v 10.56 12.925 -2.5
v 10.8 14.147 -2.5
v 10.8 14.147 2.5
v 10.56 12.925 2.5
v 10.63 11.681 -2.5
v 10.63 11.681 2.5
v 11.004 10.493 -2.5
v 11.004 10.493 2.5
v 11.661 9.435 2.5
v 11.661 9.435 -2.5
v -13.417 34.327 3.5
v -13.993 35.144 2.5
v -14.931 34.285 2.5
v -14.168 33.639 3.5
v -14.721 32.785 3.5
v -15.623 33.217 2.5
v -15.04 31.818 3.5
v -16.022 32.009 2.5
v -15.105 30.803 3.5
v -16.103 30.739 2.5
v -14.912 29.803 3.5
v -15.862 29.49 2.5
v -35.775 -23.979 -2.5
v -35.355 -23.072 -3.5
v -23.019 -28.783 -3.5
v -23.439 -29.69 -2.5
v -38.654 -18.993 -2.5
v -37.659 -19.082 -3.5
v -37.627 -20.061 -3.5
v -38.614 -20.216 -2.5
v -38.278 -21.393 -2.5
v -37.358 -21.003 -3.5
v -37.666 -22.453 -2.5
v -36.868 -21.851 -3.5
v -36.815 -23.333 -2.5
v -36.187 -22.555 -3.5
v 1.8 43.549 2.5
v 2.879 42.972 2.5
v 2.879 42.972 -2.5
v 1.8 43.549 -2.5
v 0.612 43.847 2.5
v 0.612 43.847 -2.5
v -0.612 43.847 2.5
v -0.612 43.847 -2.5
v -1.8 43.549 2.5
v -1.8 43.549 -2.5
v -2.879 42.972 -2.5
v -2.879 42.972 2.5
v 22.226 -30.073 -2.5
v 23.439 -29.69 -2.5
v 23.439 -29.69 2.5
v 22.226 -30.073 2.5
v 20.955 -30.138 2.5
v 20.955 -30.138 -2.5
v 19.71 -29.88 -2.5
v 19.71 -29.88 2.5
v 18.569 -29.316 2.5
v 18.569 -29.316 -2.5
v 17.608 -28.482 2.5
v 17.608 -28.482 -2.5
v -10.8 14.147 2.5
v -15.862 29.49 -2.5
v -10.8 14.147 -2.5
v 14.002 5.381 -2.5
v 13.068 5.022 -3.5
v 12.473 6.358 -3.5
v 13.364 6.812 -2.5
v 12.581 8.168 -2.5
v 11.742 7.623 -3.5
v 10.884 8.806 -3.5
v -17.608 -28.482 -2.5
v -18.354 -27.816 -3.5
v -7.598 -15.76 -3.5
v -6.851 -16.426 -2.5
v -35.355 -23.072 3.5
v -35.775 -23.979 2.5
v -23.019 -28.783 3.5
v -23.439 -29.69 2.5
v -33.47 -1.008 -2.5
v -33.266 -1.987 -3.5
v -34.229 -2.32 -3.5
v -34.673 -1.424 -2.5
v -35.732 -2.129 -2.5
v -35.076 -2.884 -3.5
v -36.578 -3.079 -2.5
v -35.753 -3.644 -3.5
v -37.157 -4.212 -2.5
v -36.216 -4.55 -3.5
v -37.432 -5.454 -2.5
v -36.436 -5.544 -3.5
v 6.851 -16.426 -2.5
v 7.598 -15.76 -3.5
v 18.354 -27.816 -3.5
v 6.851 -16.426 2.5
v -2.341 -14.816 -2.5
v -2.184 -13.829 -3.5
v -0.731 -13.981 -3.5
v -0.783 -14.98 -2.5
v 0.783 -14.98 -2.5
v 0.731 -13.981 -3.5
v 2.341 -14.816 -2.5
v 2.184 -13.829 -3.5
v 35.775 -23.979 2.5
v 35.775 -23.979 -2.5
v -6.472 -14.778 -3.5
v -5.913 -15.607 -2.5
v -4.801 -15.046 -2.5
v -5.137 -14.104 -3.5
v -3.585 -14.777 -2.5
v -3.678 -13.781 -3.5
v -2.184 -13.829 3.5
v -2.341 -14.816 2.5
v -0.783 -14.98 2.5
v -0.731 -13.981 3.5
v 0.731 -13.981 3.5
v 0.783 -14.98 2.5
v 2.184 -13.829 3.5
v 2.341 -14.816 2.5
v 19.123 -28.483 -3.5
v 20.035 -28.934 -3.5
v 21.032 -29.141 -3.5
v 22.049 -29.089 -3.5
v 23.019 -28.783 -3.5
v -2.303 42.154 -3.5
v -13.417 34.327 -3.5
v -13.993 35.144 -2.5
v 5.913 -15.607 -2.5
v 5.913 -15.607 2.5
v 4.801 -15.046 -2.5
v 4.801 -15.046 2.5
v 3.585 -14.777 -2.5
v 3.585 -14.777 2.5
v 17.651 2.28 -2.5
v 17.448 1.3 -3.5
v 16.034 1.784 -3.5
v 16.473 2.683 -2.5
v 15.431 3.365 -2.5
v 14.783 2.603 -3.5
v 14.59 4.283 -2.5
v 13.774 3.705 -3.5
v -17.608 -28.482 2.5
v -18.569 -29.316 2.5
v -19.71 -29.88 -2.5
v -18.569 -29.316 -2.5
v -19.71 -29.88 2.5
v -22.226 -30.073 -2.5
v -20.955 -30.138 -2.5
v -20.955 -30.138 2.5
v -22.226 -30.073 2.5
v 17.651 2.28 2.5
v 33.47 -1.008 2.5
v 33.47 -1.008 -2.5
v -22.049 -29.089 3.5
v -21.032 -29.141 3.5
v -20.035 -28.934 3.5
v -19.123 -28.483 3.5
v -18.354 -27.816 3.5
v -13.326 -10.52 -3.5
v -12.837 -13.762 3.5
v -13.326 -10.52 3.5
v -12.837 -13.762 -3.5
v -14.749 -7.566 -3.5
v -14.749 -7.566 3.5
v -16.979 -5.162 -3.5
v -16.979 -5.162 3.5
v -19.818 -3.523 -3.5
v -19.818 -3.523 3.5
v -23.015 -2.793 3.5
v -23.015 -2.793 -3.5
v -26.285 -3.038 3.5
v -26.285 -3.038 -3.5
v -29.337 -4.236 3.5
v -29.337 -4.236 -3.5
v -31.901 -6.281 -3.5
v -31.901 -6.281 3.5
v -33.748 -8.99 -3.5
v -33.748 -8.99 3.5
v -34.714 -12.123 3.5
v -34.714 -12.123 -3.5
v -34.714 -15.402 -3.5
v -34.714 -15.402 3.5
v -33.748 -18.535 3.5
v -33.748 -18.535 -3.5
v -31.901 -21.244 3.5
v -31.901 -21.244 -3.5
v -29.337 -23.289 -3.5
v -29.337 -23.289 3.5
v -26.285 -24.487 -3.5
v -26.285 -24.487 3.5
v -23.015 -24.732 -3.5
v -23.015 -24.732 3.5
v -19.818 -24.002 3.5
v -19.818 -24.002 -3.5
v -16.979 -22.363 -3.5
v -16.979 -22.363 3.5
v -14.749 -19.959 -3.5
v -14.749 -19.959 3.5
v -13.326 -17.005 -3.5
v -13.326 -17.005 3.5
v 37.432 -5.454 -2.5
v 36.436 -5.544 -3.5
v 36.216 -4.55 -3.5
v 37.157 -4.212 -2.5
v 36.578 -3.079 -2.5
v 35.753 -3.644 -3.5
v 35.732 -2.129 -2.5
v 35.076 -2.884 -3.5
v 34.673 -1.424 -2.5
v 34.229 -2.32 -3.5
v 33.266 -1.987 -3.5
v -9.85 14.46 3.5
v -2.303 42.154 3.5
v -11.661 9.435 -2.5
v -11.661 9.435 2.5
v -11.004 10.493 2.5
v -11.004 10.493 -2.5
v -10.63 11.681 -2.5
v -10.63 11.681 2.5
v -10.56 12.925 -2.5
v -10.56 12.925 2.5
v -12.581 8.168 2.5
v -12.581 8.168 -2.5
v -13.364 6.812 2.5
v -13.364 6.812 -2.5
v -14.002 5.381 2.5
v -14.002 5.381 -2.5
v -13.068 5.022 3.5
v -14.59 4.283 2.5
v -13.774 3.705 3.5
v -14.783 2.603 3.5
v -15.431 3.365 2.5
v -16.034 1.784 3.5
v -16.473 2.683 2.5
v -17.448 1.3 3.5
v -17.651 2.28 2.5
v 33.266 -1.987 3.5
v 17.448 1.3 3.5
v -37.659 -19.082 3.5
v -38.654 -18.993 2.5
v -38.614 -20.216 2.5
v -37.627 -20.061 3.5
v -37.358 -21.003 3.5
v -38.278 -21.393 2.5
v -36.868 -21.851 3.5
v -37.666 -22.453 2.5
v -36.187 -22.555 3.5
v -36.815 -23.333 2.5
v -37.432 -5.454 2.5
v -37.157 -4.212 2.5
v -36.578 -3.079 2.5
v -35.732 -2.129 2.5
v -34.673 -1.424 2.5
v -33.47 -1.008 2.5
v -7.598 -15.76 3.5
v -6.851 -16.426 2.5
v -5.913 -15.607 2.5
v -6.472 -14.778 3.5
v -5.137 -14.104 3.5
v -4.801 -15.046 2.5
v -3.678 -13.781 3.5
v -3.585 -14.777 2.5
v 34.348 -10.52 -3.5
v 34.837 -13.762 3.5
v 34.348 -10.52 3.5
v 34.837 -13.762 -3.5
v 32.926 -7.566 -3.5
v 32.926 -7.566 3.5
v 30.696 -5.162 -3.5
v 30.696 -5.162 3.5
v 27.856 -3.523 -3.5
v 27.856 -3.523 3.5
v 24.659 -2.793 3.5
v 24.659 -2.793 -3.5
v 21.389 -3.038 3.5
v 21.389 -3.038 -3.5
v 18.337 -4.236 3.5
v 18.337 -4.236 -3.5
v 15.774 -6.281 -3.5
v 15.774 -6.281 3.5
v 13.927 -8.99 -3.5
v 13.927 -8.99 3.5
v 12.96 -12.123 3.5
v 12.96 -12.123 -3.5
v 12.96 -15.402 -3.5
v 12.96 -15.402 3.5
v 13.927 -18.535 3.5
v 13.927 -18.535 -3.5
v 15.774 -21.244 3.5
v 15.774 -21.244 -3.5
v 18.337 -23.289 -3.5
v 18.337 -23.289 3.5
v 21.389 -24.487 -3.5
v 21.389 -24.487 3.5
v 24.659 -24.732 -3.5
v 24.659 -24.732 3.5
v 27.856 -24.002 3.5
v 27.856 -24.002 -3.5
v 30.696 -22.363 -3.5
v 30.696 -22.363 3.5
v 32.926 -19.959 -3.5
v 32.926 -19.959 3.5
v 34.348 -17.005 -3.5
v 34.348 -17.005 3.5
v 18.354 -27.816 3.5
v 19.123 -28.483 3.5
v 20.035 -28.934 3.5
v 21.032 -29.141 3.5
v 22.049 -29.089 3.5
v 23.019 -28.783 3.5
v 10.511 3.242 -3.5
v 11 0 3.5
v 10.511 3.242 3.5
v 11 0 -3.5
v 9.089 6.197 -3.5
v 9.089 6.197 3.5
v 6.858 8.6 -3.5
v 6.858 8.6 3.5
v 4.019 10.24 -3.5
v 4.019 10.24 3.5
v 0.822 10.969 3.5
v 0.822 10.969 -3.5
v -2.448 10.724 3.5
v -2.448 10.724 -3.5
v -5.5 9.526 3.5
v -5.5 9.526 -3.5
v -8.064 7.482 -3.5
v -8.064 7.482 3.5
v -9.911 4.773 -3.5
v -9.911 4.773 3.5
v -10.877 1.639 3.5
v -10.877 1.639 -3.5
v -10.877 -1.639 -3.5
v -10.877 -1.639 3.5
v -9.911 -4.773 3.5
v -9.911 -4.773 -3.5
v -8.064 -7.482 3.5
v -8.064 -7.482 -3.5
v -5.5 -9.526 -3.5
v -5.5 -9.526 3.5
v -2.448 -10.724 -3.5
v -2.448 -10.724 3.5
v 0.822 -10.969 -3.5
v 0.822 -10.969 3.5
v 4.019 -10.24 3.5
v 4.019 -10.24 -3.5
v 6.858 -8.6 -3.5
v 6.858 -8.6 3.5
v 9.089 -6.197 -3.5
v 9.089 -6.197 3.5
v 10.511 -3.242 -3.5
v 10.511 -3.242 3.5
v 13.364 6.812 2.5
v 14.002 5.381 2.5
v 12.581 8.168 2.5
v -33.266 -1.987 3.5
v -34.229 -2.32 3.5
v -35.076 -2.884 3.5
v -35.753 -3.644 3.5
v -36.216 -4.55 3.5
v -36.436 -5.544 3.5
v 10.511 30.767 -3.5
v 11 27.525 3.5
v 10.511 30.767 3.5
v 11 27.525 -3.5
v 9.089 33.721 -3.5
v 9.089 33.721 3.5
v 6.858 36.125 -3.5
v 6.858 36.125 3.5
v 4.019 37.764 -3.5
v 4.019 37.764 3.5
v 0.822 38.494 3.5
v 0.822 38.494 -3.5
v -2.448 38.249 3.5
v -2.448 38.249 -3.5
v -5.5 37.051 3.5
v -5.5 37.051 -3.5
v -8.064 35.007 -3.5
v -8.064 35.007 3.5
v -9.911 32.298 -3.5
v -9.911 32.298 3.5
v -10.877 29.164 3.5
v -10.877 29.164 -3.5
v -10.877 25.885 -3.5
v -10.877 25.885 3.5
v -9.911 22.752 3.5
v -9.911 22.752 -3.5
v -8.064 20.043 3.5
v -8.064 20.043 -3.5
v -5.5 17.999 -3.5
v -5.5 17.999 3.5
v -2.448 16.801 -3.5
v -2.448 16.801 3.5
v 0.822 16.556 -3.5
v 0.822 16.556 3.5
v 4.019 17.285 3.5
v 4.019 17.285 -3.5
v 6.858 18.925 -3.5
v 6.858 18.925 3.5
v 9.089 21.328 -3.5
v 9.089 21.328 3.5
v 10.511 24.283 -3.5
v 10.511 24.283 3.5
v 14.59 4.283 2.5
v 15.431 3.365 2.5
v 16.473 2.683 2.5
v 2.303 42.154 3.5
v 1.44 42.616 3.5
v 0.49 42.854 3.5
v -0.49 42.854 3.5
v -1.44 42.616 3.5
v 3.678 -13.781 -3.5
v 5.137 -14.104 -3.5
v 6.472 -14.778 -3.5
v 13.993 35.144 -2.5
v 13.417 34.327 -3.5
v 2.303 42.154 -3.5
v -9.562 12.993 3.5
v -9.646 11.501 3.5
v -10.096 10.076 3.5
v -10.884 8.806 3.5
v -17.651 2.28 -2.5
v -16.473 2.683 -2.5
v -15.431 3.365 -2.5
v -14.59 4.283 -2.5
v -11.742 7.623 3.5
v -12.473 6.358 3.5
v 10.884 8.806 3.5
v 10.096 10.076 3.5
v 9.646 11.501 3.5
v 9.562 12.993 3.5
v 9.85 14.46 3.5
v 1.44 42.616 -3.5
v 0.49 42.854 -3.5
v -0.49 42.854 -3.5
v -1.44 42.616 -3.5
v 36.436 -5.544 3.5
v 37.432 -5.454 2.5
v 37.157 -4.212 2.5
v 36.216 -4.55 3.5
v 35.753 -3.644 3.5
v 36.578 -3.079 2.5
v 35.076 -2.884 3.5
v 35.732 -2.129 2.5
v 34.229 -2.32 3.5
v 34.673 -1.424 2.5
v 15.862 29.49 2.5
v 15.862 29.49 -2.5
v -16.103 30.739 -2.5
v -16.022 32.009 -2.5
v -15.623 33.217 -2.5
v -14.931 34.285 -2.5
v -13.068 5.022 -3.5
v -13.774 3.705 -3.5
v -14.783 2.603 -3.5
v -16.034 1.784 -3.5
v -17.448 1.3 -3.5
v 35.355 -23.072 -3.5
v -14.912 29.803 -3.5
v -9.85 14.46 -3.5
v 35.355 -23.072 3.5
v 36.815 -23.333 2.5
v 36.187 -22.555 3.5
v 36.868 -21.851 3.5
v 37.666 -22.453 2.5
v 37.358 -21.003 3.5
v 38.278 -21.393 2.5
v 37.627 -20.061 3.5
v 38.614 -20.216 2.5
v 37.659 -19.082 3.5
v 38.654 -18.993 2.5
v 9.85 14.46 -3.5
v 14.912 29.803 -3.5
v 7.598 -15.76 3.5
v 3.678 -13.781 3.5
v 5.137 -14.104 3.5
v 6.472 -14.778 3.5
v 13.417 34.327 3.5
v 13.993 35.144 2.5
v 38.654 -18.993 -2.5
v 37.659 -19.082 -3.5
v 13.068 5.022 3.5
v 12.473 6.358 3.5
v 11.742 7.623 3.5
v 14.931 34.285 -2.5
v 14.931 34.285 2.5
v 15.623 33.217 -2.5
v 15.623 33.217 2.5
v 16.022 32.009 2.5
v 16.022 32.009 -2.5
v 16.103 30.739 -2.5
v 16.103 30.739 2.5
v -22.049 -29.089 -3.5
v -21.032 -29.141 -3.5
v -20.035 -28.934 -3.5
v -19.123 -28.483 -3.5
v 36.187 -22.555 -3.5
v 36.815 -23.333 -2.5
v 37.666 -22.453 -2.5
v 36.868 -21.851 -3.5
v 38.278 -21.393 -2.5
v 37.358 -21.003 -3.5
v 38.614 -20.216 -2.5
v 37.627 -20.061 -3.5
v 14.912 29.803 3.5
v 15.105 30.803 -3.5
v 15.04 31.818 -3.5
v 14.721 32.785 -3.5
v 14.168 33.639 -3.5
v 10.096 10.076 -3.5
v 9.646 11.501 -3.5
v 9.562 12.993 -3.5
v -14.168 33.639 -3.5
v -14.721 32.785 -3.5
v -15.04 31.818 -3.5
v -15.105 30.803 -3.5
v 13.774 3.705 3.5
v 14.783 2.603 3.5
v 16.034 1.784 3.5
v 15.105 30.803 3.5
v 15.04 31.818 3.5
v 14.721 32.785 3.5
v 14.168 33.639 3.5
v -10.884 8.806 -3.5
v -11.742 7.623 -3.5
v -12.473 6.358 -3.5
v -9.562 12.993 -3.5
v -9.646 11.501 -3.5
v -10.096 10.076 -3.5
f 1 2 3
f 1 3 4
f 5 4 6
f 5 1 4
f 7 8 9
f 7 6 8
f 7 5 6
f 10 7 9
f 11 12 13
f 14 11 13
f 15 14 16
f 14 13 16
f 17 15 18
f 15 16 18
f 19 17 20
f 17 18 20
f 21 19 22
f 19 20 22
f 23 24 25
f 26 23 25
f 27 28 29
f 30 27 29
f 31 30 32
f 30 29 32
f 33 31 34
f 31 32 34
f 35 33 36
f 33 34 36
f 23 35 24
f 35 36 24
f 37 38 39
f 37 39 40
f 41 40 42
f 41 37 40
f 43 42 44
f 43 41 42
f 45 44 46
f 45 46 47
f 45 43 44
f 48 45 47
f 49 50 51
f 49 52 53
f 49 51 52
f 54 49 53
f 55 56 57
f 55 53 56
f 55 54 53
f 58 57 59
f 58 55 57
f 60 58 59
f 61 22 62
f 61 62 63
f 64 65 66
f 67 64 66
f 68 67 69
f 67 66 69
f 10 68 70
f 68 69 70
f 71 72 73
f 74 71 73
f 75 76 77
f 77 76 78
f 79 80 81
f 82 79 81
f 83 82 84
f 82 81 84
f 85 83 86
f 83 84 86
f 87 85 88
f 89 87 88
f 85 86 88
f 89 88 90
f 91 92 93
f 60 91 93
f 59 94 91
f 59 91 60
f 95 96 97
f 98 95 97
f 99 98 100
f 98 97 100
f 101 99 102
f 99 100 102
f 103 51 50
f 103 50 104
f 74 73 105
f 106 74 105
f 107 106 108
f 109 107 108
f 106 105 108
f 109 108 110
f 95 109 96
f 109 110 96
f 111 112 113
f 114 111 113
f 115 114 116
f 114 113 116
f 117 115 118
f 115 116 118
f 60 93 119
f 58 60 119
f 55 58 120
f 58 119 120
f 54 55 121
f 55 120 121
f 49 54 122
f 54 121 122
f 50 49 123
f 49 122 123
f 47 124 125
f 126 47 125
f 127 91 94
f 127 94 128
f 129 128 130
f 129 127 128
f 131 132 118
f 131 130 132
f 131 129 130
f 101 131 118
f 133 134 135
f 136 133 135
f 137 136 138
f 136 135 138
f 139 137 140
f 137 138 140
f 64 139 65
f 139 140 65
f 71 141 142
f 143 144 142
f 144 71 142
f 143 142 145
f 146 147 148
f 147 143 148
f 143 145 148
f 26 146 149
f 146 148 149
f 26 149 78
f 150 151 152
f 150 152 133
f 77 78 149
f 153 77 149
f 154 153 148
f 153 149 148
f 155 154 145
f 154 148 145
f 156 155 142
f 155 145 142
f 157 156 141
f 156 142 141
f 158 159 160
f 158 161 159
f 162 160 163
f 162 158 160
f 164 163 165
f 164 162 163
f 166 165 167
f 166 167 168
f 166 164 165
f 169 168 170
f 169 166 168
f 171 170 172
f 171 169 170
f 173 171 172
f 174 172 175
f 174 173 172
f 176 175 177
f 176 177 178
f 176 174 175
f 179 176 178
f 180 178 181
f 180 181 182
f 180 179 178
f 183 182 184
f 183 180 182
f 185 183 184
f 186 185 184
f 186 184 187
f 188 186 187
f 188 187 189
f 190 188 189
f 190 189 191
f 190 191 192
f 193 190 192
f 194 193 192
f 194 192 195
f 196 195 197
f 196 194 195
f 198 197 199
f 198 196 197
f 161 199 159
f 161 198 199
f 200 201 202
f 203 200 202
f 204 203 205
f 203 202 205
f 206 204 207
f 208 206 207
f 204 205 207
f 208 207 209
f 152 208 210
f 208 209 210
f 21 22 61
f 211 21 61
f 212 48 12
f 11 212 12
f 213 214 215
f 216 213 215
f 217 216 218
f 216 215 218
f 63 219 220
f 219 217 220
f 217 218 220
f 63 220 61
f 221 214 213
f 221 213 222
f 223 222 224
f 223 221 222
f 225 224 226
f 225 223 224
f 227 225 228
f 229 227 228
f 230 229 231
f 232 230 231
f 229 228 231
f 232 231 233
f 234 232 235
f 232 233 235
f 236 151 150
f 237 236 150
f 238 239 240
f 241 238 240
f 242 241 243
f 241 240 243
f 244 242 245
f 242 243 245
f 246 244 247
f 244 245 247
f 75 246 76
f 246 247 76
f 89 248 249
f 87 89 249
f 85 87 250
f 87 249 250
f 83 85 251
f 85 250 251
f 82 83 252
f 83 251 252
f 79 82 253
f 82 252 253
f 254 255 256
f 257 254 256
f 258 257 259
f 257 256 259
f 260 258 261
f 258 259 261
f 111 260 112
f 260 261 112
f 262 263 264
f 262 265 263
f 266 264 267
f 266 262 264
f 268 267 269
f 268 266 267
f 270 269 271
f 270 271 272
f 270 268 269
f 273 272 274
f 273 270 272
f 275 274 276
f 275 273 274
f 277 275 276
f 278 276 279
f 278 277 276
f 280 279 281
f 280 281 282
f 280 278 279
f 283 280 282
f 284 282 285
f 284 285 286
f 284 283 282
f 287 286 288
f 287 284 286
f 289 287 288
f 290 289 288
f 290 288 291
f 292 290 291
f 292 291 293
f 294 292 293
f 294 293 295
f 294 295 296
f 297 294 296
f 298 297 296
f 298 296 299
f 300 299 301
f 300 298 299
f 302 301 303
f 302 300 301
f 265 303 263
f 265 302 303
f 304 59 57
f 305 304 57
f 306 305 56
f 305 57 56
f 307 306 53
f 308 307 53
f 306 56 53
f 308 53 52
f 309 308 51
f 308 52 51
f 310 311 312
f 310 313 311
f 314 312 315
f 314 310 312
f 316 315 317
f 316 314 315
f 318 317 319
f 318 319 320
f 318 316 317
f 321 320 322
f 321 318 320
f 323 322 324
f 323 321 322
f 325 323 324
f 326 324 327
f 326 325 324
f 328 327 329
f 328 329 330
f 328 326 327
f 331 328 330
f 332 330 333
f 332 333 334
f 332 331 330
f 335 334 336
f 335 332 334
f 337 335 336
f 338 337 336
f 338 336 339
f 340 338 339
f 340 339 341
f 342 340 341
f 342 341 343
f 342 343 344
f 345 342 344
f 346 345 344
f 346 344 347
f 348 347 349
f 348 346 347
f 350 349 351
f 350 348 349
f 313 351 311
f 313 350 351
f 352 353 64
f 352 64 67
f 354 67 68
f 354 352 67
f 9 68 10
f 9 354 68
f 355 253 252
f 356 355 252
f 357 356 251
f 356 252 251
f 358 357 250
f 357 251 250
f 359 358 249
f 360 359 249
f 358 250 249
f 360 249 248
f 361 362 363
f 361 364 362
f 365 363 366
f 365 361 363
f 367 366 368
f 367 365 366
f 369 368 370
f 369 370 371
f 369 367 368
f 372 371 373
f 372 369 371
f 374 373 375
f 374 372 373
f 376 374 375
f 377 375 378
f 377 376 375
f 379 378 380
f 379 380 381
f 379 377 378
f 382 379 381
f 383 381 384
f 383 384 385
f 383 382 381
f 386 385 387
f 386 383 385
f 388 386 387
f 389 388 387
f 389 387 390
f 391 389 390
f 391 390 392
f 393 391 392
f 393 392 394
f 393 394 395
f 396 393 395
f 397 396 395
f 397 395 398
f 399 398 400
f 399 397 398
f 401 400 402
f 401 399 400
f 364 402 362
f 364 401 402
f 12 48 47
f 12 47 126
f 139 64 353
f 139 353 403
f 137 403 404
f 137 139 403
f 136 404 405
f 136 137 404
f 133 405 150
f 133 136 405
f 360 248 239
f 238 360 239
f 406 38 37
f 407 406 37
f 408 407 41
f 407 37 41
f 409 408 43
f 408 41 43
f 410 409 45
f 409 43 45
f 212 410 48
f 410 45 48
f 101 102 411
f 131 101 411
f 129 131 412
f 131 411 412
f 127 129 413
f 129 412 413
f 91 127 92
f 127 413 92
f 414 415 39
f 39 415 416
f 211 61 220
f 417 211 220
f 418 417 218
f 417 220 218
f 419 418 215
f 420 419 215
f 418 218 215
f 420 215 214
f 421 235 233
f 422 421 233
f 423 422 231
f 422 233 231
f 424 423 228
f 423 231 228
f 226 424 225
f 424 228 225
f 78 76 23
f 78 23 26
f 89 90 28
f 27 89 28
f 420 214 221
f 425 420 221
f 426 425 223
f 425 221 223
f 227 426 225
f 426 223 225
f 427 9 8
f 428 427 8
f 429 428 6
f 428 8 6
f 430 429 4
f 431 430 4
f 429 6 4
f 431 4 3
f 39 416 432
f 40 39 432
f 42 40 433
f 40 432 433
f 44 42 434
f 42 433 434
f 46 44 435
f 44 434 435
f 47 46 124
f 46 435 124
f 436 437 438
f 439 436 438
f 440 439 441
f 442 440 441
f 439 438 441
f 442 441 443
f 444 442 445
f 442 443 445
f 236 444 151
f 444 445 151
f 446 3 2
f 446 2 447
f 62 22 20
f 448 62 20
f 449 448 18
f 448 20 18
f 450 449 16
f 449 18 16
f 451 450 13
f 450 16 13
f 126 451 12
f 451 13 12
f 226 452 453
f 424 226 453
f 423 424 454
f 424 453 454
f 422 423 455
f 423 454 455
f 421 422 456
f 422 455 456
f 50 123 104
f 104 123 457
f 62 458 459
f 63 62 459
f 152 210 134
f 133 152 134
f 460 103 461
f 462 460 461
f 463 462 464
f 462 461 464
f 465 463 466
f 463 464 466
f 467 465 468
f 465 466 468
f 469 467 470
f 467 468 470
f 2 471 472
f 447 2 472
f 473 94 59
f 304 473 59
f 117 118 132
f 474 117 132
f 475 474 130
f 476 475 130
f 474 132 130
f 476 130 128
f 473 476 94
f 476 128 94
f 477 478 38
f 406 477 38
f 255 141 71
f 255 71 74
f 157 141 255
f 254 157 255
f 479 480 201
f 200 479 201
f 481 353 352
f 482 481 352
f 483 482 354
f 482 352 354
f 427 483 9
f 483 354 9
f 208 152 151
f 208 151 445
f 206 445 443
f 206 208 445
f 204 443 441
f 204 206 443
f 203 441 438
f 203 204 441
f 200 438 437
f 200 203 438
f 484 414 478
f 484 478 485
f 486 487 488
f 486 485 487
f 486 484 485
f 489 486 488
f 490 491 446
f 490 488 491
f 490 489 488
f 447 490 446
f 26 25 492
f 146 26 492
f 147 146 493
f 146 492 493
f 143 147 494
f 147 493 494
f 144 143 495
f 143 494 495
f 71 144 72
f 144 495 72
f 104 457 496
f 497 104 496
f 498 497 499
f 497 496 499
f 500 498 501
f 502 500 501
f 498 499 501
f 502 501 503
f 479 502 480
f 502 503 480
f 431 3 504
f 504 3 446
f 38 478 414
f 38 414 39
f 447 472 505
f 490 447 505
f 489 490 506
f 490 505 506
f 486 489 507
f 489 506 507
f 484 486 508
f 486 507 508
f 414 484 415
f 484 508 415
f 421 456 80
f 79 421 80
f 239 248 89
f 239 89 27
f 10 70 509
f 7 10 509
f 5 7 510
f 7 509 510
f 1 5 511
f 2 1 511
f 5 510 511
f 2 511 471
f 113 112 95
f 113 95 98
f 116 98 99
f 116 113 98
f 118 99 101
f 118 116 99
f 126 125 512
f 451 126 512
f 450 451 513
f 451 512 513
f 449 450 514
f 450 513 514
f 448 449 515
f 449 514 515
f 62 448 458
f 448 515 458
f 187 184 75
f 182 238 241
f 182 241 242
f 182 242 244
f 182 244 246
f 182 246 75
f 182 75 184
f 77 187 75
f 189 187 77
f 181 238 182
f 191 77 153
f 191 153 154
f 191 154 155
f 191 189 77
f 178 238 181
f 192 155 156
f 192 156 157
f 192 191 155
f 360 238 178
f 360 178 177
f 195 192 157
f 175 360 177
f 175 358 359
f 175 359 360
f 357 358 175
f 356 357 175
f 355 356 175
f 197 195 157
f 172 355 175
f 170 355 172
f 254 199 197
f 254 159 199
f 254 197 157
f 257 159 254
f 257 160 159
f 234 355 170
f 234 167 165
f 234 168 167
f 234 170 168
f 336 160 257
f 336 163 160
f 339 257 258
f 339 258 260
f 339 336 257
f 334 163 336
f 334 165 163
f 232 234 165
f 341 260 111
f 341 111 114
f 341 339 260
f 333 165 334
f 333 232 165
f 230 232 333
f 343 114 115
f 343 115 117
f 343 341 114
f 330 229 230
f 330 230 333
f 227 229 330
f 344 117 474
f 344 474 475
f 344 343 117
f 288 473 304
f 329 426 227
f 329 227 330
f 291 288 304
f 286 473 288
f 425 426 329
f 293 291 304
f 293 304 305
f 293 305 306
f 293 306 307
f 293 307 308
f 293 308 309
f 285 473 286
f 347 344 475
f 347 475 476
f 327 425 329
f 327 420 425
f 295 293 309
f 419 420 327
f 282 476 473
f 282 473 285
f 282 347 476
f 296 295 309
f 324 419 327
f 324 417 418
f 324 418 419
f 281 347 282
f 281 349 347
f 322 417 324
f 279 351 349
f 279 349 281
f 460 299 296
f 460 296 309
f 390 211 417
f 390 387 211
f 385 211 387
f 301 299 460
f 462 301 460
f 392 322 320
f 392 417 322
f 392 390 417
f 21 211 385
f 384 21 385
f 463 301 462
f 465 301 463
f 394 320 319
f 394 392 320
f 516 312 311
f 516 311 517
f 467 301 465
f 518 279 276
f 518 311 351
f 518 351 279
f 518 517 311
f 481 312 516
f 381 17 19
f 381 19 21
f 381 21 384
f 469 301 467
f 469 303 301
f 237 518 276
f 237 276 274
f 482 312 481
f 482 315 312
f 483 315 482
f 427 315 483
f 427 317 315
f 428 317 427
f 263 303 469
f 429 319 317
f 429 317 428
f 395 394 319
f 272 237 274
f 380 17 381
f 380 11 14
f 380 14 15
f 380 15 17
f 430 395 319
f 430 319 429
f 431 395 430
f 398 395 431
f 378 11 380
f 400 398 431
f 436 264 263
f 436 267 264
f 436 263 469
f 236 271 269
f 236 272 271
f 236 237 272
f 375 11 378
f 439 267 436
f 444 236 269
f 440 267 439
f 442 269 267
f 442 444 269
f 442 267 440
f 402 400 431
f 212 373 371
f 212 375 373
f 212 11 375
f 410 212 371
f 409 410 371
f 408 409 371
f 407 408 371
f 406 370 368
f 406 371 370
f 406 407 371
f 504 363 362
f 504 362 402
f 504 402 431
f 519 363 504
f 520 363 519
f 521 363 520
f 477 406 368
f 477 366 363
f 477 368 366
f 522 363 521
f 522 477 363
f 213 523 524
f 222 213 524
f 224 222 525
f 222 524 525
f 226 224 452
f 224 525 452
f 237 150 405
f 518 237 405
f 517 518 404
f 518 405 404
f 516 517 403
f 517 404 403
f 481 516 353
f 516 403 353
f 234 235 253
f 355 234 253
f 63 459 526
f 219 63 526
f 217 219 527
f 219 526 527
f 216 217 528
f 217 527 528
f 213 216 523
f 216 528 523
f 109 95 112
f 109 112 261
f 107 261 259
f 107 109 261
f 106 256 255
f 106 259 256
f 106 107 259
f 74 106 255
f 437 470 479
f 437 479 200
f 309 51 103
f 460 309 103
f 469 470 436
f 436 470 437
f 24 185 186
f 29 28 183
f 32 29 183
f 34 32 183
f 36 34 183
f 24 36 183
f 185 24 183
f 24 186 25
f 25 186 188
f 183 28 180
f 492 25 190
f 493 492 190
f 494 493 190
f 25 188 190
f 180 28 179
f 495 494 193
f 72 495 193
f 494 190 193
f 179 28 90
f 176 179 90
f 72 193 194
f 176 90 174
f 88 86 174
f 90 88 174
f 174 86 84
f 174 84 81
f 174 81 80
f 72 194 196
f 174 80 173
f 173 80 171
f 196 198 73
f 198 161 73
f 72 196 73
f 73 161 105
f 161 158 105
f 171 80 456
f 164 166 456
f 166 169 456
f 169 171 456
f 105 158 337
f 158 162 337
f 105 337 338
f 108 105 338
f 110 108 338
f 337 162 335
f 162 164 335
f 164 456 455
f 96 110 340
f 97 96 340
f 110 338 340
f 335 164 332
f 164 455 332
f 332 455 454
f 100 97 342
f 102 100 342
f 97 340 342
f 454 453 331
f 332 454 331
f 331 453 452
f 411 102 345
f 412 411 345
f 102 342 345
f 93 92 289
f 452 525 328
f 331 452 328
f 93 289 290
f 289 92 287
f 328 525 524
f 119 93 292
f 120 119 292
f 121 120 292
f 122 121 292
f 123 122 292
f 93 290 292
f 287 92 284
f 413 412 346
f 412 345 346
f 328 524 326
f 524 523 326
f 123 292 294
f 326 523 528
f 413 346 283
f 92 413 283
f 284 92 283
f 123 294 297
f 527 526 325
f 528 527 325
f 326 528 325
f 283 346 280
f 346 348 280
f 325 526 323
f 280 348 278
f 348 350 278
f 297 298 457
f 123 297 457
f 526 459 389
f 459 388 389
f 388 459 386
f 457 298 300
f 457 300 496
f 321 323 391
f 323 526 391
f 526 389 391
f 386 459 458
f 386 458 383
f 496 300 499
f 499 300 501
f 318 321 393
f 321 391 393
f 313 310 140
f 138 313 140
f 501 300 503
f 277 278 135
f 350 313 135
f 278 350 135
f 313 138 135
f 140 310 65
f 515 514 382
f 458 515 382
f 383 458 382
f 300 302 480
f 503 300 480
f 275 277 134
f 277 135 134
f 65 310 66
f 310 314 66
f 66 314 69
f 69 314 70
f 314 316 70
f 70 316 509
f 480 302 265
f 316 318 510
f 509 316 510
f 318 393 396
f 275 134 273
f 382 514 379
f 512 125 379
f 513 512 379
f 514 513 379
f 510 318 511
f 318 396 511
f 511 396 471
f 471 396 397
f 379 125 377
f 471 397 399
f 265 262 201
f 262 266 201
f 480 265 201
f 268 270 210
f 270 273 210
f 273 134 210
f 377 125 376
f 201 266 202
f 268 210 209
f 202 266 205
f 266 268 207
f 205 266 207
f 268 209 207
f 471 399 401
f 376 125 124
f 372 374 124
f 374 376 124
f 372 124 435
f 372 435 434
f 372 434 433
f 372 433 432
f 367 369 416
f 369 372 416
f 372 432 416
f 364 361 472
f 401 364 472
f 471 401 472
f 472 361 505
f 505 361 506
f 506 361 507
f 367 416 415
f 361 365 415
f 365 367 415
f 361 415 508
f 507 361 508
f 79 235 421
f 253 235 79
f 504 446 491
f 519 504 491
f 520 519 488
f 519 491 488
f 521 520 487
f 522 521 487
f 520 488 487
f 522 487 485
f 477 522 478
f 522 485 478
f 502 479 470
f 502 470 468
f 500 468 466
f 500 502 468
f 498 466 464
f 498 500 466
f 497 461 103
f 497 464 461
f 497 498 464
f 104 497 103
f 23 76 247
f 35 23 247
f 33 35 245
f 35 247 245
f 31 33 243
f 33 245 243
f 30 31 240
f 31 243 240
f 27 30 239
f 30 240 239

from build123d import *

# Parameters (mm, degrees)
F0_R     = 11
F1_DEPTH = 3.5
F2_R     = 5
F3_SIZE  = 1


with BuildPart() as f1:
    # F0 (on Top) → F1 (new body, symmetric)
    with BuildSketch(Plane.XY):
        with BuildLine():
            Line((17.023025, 33.009872), (0, 45))
            Line((0, 45), (-17.023025, 33.009872))
            Line((-17.023025, 33.009872), (-9.861474, 11.302714))
            ThreePointArc((-9.861474, 11.302714), (0, 15), (9.861474, 11.302714))
            Line((9.861474, 11.302714), (17.023025, 33.009872))
        make_face()
        with Locations((0, 27.524821)):
            Circle(F0_R, mode=Mode.SUBTRACT)
        with BuildLine():
            ThreePointArc((-4.8577, -14.191644), (-12.990381, -7.5), (-14.719174, 2.88893))
            Line((-14.719174, 2.88893), (-37.0989, -1.762564))
            Line((-37.0989, -1.762564), (-38.971143, -22.5))
            Line((-38.971143, -22.5), (-20.075875, -31.247308))
            Line((-20.075875, -31.247308), (-4.8577, -14.191644))
        make_face()
        with Locations((-23.837195, -13.762411)):
            Circle(F0_R, mode=Mode.SUBTRACT)
        with BuildLine():
            Line((37.0989, -1.762564), (14.719174, 2.88893))
            ThreePointArc((14.719174, 2.88893), (14.929628, 1.451273), (15, 0))
            ThreePointArc((15, 0), (12.203801, -8.721654), (4.8577, -14.191644))
            Line((4.8577, -14.191644), (20.075875, -31.247308))
            Line((20.075875, -31.247308), (38.971143, -22.5))
            Line((38.971143, -22.5), (37.0989, -1.762564))
        make_face()
        with Locations((23.837195, -13.762411)):
            Circle(F0_R, mode=Mode.SUBTRACT)
        with BuildLine():
            ThreePointArc((9.861474, 11.302714), (0, 15), (-9.861474, 11.302714))
            ThreePointArc((-9.861474, 11.302714), (-12.990381, 7.5), (-14.719174, 2.88893))
            ThreePointArc((-14.719174, 2.88893), (-12.990381, -7.5), (-4.8577, -14.191644))
            ThreePointArc((-4.8577, -14.191644), (0, -15), (4.8577, -14.191644))
            ThreePointArc((4.8577, -14.191644), (12.203801, -8.721654), (15, 0))
            ThreePointArc((15, 0), (14.929628, 1.451273), (14.719174, 2.88893))
            ThreePointArc((14.719174, 2.88893), (12.990381, 7.5), (9.861474, 11.302714))
        make_face()
        Circle(F0_R, mode=Mode.SUBTRACT)
    extrude(amount=F1_DEPTH, both=True)

    # F2
    f2_edges = [f1.edges().sort_by_distance(p)[0] for p in [
        (17.023025, 33.009872, 0),
        (9.861474, 11.302714, 0),
        (14.719174, 2.88893, 0),
        (37.0989, -1.762564, 0),
        (38.971143, -22.5, 0),
        (4.8577, -14.191644, 0),
        (20.075875, -31.247308, 0),
        (-4.8577, -14.191644, 0),
        (-20.075875, -31.247308, 0),
        (-38.971143, -22.5, 0),
        (-37.0989, -1.762564, 0),
        (-14.719174, 2.88893, 0),
        (-9.861474, 11.302714, 0),
        (-17.023025, 33.009872, 0),
        (0, 45, 0),
    ]]
    fillet(f2_edges, radius=F2_R)

    # F3
    f3_edges = [f1.edges().sort_by_distance(p)[0] for p in [
        (8.435968, 39.058145, -3.5),
        (-38.04333, -12.22331, 3.5),
    ]]
    chamfer(f3_edges, length=F3_SIZE)


solid = f1.part
